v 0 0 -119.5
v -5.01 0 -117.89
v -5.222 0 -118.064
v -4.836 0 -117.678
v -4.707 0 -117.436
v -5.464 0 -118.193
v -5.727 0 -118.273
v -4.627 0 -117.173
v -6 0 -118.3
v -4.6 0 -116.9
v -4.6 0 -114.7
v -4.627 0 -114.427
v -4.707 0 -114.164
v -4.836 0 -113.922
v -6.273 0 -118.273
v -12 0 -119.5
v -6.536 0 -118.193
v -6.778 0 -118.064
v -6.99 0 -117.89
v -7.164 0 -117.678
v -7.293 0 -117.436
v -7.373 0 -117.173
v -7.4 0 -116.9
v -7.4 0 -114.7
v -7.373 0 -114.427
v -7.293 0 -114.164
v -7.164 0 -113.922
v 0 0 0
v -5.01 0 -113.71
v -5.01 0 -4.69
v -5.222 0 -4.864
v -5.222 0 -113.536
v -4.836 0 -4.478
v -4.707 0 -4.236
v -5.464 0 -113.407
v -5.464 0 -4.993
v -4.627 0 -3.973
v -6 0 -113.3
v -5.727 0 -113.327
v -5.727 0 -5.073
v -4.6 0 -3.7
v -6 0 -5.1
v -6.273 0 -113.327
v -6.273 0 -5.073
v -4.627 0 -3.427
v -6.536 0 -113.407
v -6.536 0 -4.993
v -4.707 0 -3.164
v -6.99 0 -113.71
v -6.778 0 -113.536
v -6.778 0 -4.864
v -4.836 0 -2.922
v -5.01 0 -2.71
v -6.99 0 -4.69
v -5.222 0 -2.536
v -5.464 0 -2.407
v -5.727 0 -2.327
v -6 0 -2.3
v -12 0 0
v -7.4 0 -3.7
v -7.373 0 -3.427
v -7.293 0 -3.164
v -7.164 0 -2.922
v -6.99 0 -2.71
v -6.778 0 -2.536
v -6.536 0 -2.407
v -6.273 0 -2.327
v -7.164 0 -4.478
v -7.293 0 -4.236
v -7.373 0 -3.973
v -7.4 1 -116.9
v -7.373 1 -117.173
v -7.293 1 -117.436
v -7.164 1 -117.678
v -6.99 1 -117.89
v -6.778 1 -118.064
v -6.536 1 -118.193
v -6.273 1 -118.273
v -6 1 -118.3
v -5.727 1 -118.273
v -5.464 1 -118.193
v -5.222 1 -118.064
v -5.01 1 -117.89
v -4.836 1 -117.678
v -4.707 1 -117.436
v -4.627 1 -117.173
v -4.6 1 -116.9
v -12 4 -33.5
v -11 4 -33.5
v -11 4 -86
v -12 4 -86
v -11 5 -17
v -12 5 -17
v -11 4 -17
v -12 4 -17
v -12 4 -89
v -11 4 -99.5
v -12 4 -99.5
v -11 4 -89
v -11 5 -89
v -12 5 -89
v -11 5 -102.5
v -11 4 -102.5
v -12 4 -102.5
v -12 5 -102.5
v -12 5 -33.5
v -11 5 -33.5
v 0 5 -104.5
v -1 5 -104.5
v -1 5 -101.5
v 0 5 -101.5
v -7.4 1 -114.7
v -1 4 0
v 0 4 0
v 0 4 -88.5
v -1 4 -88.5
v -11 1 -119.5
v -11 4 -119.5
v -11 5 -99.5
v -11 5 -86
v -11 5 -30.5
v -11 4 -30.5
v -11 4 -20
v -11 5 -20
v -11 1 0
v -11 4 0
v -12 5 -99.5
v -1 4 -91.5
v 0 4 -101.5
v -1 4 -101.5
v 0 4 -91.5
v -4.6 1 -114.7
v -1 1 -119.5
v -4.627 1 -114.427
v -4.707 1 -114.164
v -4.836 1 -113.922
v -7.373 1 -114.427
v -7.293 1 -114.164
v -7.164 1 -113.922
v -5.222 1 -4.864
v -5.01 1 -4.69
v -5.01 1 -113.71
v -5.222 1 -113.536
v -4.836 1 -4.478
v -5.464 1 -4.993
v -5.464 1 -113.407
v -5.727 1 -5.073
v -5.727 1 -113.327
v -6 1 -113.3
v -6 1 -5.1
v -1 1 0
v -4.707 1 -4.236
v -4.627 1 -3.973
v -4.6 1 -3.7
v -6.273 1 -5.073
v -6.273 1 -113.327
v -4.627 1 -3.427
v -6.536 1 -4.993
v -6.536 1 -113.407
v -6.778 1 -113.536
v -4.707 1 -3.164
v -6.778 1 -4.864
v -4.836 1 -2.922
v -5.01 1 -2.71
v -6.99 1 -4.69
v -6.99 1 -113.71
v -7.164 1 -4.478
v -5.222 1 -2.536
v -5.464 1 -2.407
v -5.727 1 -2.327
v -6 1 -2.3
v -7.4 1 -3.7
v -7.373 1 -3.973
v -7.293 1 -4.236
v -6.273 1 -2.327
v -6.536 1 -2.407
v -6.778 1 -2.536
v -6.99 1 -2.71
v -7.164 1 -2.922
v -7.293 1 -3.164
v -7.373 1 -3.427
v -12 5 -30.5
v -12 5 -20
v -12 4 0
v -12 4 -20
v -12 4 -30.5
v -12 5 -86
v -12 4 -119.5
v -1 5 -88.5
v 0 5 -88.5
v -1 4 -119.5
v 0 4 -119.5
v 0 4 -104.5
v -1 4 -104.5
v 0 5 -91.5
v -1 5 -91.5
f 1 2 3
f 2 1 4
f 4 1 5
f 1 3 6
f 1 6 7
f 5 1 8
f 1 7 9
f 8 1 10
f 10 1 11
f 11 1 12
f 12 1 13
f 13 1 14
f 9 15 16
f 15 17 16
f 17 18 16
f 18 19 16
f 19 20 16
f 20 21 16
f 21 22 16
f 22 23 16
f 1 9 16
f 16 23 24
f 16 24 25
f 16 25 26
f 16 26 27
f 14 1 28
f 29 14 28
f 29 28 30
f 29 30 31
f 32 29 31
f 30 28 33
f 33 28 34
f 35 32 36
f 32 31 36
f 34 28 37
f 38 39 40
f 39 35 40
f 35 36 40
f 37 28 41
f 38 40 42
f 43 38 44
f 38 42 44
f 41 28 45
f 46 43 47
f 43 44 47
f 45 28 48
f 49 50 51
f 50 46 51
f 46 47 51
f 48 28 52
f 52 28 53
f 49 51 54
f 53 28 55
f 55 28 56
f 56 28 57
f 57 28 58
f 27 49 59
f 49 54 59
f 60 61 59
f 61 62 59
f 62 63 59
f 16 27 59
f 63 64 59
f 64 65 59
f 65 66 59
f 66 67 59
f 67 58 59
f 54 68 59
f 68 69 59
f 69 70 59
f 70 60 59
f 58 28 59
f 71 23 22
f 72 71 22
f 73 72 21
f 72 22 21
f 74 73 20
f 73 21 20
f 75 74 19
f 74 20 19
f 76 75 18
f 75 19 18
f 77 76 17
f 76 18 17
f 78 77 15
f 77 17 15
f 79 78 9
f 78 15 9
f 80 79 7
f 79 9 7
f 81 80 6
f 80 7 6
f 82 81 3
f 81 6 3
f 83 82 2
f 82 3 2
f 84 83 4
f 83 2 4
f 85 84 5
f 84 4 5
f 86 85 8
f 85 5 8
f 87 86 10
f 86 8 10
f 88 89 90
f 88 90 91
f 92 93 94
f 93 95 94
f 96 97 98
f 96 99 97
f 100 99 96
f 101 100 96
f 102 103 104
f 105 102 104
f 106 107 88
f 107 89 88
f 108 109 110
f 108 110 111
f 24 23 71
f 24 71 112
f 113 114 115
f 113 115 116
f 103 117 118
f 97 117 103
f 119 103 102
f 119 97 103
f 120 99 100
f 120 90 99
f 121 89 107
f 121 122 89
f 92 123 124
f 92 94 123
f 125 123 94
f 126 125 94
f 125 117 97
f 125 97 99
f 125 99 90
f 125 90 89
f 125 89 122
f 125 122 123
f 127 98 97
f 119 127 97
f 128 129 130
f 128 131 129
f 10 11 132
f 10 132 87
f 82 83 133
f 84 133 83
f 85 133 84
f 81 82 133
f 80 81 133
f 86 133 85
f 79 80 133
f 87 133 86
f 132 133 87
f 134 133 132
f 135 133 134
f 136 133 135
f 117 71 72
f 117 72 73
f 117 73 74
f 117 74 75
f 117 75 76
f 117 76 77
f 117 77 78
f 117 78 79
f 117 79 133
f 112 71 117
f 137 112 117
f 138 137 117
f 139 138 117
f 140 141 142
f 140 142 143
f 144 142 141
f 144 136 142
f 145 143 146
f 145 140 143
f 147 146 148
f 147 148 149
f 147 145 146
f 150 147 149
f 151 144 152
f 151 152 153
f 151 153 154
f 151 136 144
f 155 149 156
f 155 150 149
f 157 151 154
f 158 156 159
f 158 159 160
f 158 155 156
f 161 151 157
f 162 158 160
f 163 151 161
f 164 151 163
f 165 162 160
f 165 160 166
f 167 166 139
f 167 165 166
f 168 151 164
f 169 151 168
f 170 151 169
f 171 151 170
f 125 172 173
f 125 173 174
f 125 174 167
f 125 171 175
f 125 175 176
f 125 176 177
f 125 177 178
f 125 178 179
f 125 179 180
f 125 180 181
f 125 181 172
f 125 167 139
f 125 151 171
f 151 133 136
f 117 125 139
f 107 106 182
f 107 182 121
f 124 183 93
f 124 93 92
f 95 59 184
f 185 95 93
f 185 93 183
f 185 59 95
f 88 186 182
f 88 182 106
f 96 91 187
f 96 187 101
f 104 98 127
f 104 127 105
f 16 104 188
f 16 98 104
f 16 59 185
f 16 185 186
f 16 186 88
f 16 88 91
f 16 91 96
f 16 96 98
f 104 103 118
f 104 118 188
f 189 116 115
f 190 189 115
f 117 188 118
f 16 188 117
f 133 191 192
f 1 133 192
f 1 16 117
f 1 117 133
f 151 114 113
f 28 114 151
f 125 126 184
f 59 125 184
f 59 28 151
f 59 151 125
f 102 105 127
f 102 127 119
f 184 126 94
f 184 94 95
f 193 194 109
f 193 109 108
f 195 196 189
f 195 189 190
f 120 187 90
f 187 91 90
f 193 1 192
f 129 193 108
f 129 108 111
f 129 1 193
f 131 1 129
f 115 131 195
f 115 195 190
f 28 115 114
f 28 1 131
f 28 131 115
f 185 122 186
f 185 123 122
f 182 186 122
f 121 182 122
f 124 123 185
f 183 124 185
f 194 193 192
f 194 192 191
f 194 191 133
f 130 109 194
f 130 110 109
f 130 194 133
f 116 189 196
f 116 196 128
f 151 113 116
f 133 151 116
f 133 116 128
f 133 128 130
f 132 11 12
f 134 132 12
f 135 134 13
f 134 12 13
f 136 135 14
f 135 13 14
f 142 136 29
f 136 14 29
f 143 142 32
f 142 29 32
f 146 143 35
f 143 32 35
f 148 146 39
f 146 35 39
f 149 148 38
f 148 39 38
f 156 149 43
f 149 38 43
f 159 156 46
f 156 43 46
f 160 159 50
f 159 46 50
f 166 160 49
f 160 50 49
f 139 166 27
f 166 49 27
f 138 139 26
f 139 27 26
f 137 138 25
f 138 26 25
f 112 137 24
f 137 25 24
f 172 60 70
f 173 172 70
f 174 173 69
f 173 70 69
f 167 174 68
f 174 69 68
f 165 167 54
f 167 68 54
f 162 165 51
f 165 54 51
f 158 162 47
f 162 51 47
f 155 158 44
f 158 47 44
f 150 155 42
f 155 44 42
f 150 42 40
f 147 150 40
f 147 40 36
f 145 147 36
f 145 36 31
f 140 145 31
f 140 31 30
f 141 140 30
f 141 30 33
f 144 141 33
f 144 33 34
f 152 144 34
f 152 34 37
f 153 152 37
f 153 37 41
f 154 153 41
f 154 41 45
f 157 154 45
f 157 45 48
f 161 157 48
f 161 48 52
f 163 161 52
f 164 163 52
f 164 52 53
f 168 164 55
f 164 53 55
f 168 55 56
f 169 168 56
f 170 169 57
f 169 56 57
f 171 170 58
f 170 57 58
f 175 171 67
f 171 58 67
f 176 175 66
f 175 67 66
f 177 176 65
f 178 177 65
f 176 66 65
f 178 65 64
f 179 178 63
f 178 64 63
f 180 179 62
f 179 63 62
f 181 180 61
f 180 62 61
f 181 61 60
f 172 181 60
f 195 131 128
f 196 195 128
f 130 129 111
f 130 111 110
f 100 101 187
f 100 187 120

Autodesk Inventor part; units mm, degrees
ref_plane "YZ Plane" through (0, 0, 0) normal (1, 0, 0) x (0, 1, 0)
ref_plane "XZ Plane" through (0, 0, 0) normal (0, 1, 0) x (-1, 0, 0)
ref_plane "XY Plane" through (0, 0, 0) normal (0, 0, 1) x (1, 0, 0)
sketch "Sketch1" plane through (0, 0, 0) normal (0, 1, 0) x (-1, 0, 0)
  line L0 (0, 0) -> (12, 0)
  line L1 (12, 0) -> (12, -119.5)
  line L2 (12, -119.5) -> (0, -119.5)
  line L3 (0, -119.5) -> (0, 0)
  circle A0 centre (6, -3.7) radius 1.4
  line L4 (6, -113.3) -> (6, -113.3)
  line L5 (4.6, -114.7) -> (4.6, -116.9)
  line L6 (6, -118.3) -> (6, -118.3)
  line L7 (7.4, -116.9) -> (7.4, -114.7)
  arc A1 (7.4, -114.7) -> (6, -113.3) centre (6, -114.7) ccw
  arc A2 (6, -118.3) -> (7.4, -116.9) centre (6, -116.9) ccw
  arc A3 (6, -113.3) -> (4.6, -114.7) centre (6, -114.7) ccw
  arc A4 (4.6, -116.9) -> (6, -118.3) centre (6, -116.9) ccw
  point P0 (4.6, -118.3)
  point P1 (4.6, -113.3)
  dimension "d0" = 12
  dimension "d1" = 119.5
  dimension "d2" = 2.8
  dimension "d3" = 5
  dimension "d4" = 1.4
  dimension "d5" = 2.8
  dimension "d6" = 3.7
  dimension "d7" = 6
  dimension "d8" = 1.2
  dimension "d9" = 6
extrude "Extrusion1" add sketch "Sketch1" along normal blind 4
sketch "Sketch2" plane through (-12, 0, 0) normal (0, 0, 1) x (1, 0, 0)
  line L0 (12, 4) -> (0, 4) projected
  line L1 (1, 4) -> (11, 4)
  line L2 (11, 4) -> (11, 1)
  line L3 (11, 1) -> (1, 1)
  line L4 (1, 1) -> (1, 4)
  line L5 (0, 0) -> (0, 4) projected
  line L6 (12, 0) -> (12, 4) projected
  line L7 (0, 0) -> (12, 0) projected
  dimension "d12" = 1
  dimension "d13" = 1
  dimension "d14" = 1
extrude "Extrusion2" cut sketch "Sketch2" against normal through all contours L2 L3 L4 L0
sketch "Sketch3" plane through (0, 4, 0) normal (0, 1, 0) x (1, 0, 0)
  line L0 (-12, 119.5) -> (-12, 0) projected
  line L1 (-11, 0) -> (-11, 119.5) projected
  line L2 (-12, 17) -> (-11, 17)
  line L3 (-11, 17) -> (-11, 20)
  line L4 (-11, 20) -> (-12, 20)
  line L5 (-12, 20) -> (-12, 17)
  line L6 (-12, 30.5) -> (-11, 30.5)
  line L7 (-11, 30.5) -> (-11, 33.5)
  line L8 (-11, 33.5) -> (-12, 33.5)
  line L9 (-12, 33.5) -> (-12, 30.5)
  line L10 (-12, 86) -> (-11, 86)
  line L11 (-11, 86) -> (-11, 89)
  line L12 (-11, 89) -> (-12, 89)
  line L13 (-12, 89) -> (-12, 86)
  line L14 (-12, 99.5) -> (-11, 99.5)
  line L15 (-11, 99.5) -> (-11, 102.5)
  line L16 (-11, 102.5) -> (-12, 102.5)
  line L17 (-12, 102.5) -> (-12, 99.5)
  line L18 (-1, 0) -> (-1, 119.5) projected
  line L19 (0, 0) -> (0, 119.5) projected
  line L20 (0, 99.5) -> (0, 102.5)
  line L21 (-1, 102.5) -> (-1, 99.5)
  line L22 (-1, 88.5) -> (0, 88.5)
  line L23 (0, 88.5) -> (0, 91.5)
  line L24 (0, 91.5) -> (-1, 91.5)
  line L25 (-1, 91.5) -> (-1, 88.5)
  line L26 (-12, 0) -> (-11, 0) projected
  line L27 (-11, 119.5) -> (-12, 119.5) projected
  line L28 (0, 119.5) -> (-1, 119.5) projected
  line L29 (-1, 104.5) -> (0, 104.5)
  line L30 (0, 104.5) -> (0, 101.5)
  line L31 (0, 101.5) -> (-1, 101.5)
  line L32 (-1, 101.5) -> (-1, 104.5)
  point P0 (0, 88.5)
  dimension "d17" = 3
  dimension "d18" = 17
  dimension "d19" = 3
  dimension "d20" = 3
  dimension "d21" = 3
  dimension "d22" = 3
  dimension "d24" = 10.5
  dimension "d25" = 17
  dimension "d26" = 10.5
  dimension "d28" = 1
  dimension "d29" = 3
  dimension "d30" = 15
  dimension "d31" = 10
extrude "Extrusion3" add sketch "Sketch3" along normal blind 1 contours L16 L1 L14 L0 | L12 L1 L10 L0 | L8 L1 L6 L0 | L4 L1 L2 L0 | L18 L24 L19 L22 | L18 L29 L19 L31
sketch "Sketch4" plane through (0, 4, 0) normal (0, 1, 0) x (1, 0, 0)
  line L0 (0, 119.5) -> (-12, 119.5) projected
  line L1 (-6, 119.5) -> (-6, 59.75) construction
  line L2 (-1, 0) -> (-11, 0) projected
  circle A0 centre (-6, 3.7) radius 1.4 projected
  circle A1 centre (-6, 59.75) radius 56.05 construction
  point P0 (0, 0)
  dimension "d34" = 59.75
equation "\"d19\" = d17"
equation "\"d20\" = d17"
equation "\"d21\" = d17"
equation "\"d22\" = d17"
properties part number "Barra fijación calefactor" material "Aluminum 6061"
